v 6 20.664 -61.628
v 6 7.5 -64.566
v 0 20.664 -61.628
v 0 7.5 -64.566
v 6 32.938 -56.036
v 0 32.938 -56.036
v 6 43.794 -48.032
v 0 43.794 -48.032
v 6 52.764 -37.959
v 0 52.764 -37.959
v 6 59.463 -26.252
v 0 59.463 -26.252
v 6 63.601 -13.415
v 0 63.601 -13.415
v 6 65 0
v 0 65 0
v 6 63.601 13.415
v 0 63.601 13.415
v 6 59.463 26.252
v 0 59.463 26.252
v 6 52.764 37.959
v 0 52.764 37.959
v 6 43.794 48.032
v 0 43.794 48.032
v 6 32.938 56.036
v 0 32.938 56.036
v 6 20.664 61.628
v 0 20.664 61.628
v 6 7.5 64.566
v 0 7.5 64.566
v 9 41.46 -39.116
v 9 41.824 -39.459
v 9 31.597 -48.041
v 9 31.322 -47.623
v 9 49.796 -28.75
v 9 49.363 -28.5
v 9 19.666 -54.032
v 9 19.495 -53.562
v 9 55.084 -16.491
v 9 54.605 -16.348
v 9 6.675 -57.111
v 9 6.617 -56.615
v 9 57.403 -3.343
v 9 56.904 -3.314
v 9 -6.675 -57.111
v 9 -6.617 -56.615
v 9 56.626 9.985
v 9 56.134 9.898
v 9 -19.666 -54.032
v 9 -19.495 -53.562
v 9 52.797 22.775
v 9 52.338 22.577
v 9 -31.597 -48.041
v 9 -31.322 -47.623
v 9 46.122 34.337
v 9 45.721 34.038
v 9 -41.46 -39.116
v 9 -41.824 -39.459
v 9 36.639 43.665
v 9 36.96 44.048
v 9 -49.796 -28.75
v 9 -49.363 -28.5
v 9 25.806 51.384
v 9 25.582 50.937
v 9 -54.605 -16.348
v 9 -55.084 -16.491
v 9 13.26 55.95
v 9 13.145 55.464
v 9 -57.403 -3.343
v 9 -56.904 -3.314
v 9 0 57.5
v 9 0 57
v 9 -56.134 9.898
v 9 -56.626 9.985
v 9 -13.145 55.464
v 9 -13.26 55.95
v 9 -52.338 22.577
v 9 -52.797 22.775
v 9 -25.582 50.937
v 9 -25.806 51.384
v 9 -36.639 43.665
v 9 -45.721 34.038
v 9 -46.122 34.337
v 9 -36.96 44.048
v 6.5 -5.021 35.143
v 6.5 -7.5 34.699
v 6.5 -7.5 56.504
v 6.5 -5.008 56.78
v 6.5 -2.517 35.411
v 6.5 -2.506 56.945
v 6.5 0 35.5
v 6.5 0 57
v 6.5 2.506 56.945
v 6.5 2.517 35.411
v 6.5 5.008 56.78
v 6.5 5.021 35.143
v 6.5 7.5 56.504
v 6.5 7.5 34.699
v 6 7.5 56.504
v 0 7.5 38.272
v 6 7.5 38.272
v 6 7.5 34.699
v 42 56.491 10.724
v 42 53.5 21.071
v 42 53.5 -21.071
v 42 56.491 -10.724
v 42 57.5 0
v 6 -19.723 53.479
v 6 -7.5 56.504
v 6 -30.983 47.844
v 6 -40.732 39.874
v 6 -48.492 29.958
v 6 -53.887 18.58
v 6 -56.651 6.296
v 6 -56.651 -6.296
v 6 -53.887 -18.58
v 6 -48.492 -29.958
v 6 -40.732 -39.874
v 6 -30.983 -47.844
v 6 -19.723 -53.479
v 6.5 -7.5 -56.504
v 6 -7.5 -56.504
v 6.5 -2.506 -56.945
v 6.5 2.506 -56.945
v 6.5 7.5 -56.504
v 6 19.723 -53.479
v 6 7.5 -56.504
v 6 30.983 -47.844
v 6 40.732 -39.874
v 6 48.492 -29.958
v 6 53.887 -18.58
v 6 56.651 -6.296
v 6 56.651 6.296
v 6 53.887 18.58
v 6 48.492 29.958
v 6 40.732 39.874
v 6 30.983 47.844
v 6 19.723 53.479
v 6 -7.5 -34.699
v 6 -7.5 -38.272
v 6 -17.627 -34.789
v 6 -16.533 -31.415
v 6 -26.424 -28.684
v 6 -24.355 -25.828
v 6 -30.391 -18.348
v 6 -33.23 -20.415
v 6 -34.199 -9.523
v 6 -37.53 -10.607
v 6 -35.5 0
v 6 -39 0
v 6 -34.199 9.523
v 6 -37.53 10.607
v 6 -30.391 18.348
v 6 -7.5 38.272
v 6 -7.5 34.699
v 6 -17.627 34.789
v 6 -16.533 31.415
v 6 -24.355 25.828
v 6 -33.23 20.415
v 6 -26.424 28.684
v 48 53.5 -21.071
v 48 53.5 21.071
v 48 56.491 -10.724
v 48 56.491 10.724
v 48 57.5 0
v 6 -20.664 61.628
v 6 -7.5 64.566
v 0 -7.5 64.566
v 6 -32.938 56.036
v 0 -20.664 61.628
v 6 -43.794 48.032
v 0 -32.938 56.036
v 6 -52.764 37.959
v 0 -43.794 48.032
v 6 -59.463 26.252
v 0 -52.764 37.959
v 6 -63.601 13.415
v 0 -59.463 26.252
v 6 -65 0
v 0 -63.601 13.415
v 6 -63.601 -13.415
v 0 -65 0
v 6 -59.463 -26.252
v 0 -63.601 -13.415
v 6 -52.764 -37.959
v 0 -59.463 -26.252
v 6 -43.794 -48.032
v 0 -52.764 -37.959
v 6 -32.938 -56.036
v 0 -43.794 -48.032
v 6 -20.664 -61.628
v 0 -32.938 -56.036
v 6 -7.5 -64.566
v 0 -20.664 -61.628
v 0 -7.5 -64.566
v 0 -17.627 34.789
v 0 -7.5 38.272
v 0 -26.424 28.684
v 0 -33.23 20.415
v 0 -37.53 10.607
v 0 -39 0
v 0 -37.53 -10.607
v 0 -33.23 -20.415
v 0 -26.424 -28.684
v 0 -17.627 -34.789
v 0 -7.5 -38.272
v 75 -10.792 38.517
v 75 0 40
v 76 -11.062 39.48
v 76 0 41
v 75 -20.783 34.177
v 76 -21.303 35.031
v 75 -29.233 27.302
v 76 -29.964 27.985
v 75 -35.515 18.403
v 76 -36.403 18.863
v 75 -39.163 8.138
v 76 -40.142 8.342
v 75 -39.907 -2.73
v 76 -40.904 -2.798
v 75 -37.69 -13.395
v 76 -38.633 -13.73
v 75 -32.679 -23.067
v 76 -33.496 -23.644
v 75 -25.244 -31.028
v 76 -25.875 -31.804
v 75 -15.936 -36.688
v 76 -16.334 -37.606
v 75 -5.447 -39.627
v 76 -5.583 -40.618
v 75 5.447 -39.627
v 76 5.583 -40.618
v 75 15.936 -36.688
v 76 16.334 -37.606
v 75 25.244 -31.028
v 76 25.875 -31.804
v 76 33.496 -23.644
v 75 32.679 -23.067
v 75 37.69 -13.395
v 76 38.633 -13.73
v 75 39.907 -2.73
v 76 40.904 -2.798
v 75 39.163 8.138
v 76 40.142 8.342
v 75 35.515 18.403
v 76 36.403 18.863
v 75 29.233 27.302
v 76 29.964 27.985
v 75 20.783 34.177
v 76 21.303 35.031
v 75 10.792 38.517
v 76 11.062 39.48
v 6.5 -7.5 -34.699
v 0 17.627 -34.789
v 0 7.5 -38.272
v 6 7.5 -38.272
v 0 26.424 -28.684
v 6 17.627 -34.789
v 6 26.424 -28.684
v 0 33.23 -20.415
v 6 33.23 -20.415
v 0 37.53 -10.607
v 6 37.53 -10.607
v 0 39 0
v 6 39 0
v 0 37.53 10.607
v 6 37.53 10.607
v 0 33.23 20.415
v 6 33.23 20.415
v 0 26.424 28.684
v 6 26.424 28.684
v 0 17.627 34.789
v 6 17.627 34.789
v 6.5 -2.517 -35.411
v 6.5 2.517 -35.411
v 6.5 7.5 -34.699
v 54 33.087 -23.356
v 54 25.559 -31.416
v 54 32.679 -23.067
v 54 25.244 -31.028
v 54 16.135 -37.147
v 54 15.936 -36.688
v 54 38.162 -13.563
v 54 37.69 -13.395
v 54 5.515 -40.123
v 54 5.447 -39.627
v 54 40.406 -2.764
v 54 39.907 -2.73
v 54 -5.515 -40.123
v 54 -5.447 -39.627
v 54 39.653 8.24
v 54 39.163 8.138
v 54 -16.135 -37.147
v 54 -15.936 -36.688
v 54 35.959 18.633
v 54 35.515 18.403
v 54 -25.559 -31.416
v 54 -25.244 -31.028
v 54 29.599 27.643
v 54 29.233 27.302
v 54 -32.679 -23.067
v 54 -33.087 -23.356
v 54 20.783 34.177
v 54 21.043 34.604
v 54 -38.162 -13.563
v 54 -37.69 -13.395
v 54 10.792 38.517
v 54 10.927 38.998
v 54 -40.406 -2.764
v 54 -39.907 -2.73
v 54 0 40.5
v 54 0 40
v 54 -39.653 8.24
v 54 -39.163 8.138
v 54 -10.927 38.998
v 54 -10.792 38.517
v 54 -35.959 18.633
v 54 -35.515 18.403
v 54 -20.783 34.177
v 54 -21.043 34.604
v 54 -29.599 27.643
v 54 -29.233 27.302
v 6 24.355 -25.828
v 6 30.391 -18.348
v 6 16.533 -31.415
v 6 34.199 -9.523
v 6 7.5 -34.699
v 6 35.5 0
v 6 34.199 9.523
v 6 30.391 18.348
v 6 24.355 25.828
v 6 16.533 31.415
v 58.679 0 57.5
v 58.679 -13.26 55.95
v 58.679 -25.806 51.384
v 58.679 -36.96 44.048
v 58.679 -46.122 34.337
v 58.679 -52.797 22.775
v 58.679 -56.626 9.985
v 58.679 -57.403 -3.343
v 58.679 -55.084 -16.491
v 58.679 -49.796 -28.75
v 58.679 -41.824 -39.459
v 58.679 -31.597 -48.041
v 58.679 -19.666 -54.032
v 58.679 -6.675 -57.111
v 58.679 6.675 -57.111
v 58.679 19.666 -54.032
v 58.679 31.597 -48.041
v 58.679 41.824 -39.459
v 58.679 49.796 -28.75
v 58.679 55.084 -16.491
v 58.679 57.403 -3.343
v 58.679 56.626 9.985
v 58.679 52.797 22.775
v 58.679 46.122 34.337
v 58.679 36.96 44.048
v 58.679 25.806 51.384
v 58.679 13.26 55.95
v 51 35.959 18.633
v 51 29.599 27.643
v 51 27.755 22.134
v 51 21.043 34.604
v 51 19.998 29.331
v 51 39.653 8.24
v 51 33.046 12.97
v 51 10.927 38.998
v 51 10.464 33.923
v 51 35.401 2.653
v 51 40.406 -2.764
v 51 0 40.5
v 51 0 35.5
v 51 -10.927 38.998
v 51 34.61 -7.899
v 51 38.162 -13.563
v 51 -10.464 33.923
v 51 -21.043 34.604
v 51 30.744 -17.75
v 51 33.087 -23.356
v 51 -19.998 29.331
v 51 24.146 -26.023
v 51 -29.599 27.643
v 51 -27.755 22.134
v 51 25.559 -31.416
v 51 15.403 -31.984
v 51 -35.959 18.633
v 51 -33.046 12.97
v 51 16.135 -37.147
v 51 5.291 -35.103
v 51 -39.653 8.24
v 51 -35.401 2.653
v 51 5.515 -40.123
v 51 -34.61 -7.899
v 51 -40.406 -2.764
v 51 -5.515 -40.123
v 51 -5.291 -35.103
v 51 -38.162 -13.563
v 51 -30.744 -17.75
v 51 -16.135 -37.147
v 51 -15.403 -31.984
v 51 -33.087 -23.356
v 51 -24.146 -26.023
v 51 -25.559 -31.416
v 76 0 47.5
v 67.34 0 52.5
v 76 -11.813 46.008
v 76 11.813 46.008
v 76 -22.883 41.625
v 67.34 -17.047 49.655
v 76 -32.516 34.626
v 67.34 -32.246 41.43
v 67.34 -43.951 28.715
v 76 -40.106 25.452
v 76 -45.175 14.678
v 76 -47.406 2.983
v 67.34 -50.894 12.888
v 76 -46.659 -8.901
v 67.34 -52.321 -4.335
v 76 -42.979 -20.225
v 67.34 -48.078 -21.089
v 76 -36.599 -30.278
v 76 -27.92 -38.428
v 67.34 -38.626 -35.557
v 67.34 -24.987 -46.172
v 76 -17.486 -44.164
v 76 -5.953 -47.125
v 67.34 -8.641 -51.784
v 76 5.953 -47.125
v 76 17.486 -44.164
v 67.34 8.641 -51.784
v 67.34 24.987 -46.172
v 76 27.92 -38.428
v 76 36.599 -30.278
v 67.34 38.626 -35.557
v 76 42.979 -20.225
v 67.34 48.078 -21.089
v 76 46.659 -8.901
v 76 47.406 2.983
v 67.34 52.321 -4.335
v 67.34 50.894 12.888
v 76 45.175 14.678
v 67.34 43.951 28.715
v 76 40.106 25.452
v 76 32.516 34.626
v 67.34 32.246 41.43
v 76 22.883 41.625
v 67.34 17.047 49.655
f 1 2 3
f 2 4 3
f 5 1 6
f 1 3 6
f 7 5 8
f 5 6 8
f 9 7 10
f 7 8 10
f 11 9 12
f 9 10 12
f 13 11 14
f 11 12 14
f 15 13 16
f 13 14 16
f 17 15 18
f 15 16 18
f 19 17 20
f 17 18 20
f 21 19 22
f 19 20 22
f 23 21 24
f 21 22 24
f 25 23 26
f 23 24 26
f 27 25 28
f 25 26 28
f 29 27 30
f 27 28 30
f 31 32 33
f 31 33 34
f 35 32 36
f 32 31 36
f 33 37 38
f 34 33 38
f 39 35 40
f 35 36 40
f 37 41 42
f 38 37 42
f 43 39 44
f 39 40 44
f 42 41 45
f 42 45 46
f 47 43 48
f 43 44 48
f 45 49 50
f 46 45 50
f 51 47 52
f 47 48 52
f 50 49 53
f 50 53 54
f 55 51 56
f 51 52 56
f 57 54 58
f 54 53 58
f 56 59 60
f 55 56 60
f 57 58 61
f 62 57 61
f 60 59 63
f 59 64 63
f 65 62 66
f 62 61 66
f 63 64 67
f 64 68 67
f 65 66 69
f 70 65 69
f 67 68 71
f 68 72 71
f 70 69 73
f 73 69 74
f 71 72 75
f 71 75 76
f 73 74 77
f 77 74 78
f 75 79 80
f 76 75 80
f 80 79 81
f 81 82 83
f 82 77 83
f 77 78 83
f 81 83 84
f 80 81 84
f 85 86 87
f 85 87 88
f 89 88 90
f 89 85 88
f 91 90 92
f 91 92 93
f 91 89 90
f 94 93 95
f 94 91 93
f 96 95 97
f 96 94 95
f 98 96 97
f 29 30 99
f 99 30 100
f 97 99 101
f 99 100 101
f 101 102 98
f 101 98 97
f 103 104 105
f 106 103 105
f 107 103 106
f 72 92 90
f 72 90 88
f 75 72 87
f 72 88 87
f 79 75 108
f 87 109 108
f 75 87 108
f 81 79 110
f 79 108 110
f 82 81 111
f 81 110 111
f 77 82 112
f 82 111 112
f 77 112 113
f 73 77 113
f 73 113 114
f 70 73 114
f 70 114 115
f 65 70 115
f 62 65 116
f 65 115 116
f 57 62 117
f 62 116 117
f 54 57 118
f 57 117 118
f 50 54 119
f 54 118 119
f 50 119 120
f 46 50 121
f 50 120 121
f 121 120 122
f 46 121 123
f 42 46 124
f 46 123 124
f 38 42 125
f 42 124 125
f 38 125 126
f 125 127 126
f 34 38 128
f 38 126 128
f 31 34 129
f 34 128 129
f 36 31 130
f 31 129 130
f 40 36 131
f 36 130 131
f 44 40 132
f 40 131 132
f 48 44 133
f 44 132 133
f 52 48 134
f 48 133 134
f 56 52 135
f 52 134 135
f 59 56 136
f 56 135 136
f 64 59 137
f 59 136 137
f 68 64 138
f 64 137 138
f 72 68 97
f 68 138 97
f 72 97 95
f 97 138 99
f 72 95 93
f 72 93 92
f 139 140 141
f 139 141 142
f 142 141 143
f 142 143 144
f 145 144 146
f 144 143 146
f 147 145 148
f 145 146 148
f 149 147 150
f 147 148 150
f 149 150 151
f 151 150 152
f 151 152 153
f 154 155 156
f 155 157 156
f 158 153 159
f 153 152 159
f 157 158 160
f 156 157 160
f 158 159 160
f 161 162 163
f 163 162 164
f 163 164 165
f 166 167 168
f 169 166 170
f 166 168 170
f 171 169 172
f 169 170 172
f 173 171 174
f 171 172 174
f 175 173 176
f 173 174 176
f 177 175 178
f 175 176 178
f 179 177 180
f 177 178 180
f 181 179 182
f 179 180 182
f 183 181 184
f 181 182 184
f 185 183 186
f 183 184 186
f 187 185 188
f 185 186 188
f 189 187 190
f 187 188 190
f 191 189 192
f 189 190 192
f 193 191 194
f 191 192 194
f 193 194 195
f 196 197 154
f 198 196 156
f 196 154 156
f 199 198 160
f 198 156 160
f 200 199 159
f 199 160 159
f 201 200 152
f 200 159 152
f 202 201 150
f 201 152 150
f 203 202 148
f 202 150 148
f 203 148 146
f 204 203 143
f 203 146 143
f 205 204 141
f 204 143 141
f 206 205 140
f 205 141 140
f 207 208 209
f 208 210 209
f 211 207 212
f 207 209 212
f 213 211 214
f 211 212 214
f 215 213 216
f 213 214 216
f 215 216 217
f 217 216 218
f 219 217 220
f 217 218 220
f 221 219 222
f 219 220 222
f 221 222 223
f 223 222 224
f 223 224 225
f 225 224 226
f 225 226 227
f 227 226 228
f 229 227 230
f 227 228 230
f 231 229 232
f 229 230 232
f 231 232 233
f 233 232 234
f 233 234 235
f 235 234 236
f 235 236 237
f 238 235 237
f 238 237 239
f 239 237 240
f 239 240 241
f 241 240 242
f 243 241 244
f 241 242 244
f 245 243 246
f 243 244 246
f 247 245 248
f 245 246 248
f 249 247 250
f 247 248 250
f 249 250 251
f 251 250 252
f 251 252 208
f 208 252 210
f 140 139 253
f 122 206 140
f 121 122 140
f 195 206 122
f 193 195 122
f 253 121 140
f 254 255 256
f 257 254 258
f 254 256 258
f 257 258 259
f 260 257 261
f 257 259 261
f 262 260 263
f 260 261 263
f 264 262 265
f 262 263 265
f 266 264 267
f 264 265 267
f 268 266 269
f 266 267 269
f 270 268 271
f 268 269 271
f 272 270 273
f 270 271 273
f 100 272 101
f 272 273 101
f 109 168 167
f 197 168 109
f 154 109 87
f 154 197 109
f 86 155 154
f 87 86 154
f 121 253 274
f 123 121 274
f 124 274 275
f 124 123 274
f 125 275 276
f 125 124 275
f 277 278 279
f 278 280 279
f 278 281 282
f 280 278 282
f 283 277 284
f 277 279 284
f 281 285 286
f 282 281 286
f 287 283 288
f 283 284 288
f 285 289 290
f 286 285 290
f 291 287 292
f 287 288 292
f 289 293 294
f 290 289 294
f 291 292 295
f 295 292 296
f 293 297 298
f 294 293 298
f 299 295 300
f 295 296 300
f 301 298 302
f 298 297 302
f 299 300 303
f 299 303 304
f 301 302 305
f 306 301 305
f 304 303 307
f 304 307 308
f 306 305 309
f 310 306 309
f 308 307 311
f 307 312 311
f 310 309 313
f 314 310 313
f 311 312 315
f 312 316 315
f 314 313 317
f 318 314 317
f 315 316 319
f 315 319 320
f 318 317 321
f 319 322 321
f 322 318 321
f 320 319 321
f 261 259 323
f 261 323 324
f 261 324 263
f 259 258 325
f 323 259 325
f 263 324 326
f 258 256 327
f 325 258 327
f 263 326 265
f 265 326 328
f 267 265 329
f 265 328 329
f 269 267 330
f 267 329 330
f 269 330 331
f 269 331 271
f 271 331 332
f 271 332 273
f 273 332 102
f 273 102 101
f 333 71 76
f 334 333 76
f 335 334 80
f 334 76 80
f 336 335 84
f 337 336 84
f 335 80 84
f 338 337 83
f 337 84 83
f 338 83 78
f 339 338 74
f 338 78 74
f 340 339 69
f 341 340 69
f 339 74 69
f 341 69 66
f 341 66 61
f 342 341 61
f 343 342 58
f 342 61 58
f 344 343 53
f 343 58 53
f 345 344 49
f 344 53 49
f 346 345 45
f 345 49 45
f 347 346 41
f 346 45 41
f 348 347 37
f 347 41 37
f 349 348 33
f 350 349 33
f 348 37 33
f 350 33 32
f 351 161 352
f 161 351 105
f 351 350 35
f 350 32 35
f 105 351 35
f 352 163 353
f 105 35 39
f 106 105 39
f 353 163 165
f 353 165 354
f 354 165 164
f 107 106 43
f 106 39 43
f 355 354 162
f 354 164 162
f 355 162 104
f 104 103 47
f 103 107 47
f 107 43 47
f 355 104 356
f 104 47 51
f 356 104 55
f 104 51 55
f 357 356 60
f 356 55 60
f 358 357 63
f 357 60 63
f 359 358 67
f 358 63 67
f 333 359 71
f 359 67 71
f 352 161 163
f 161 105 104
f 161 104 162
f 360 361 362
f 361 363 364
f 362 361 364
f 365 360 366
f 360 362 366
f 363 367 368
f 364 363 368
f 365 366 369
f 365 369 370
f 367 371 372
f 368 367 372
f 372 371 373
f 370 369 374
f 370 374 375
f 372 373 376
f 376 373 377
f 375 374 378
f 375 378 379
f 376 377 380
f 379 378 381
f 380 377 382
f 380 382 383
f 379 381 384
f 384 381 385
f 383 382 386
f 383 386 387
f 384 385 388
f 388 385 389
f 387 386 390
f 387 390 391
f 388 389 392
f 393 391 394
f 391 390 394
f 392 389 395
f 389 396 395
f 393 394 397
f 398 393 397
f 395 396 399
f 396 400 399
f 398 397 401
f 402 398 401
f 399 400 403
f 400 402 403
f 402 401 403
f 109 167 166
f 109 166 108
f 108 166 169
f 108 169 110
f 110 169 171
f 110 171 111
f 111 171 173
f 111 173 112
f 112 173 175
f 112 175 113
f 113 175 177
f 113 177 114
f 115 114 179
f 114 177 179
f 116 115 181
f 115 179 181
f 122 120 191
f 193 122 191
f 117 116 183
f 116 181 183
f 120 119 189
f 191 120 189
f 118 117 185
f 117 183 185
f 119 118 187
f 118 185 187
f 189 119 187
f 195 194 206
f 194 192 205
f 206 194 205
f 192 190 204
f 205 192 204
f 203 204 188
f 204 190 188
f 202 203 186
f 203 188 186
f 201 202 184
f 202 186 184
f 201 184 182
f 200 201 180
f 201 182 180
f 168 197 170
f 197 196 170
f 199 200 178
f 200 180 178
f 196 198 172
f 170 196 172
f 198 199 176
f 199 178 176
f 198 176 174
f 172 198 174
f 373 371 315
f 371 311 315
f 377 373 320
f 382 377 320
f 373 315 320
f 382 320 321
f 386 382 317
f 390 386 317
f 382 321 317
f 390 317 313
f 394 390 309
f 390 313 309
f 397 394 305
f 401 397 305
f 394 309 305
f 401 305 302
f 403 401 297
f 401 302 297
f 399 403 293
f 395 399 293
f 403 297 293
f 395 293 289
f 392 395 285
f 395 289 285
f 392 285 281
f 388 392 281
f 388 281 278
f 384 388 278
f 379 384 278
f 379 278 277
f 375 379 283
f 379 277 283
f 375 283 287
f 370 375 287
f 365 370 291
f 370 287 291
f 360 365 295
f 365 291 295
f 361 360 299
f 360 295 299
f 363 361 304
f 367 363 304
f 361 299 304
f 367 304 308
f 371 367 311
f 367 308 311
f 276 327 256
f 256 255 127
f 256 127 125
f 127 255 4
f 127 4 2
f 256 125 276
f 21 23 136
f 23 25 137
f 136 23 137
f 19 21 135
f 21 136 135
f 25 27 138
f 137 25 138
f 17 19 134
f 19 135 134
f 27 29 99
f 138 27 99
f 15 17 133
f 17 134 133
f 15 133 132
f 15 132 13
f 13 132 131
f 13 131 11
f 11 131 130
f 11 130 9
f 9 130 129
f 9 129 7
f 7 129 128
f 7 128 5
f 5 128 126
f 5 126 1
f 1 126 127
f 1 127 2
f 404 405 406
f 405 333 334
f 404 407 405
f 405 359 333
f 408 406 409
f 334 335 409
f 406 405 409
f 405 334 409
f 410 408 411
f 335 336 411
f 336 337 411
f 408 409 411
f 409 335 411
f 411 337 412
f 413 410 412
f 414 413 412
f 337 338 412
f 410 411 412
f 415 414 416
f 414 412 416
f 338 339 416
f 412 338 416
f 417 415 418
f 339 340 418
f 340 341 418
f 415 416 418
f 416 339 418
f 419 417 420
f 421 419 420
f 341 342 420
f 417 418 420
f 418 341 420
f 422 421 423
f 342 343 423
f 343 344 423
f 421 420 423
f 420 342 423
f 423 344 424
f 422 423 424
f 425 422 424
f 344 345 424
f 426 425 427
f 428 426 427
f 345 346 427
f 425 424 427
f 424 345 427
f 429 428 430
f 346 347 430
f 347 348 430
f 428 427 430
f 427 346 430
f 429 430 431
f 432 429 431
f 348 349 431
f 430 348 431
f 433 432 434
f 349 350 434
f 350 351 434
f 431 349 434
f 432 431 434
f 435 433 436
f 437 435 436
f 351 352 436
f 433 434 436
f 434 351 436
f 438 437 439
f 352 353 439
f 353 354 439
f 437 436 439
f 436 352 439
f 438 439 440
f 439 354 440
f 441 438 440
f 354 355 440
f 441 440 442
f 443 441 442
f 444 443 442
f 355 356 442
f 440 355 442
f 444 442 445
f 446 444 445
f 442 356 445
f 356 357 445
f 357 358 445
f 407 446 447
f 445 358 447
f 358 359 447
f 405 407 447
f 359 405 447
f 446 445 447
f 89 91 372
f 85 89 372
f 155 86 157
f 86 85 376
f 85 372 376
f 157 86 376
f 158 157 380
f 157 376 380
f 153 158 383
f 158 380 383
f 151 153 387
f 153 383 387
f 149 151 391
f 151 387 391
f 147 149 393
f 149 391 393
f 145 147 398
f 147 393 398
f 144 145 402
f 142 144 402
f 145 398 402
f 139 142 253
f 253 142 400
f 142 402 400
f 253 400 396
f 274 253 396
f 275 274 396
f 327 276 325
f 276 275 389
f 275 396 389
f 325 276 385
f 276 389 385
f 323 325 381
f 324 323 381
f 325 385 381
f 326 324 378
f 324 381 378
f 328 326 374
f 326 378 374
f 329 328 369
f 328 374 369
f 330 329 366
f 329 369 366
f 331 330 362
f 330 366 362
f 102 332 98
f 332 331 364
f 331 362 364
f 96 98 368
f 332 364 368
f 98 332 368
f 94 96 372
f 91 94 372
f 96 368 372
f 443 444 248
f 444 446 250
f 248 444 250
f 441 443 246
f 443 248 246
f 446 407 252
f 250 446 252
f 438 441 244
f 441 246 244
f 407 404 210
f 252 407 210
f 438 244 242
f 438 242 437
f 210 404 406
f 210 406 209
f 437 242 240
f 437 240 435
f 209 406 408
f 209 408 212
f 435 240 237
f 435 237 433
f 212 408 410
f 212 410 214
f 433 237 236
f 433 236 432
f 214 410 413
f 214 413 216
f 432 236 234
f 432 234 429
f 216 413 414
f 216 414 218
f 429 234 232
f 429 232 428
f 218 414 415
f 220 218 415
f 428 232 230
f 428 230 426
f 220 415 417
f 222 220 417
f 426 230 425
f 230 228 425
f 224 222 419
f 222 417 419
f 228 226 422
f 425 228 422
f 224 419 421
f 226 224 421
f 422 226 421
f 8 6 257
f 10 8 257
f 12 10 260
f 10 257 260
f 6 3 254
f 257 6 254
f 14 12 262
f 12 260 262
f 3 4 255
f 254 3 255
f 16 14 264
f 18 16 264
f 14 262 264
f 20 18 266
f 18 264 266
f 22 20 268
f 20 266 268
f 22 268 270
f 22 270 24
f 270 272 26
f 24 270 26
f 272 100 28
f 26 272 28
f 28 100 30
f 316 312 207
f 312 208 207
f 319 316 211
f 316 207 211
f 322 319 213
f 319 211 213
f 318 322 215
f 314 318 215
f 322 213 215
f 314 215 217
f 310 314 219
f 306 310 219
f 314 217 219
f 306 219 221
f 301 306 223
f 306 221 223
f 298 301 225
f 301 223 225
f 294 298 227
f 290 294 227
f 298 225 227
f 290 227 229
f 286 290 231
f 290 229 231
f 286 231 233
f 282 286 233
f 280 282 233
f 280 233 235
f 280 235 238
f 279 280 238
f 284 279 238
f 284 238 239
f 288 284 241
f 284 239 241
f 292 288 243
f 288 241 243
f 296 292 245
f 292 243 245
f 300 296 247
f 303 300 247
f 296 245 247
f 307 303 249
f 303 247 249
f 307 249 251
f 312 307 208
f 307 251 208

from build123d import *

# Parameters (mm, degrees)
CUT_EXTRUDE_1_DEPTH      = 120.272796563
CUT_EXTRUDE_1_DEPTH_BACK = 120.272796563
SKETCH_2_W               = 6
SKETCH_2_H               = 4
SKETCH_2_W_2             = 6.5
SKETCH_2_H_2             = 15


with BuildPart() as part:
    # Эскиз1 → Повернуть1 (revolve)
    with BuildSketch(Plane.XY, mode=Mode.PRIVATE) as revolve_1_sk:
        Polygon((0, 39), (6, 39), (6, 35.5), (51, 35.5), (51, 40.5), (54, 40.5), (54, 40), (75, 40), (76, 41), (76, 47.5), (58.679491924, 57.5), (9, 57.5), (9, 57), (6, 57), (6, 65), (0, 65), align=None)
    revolve(revolve_1_sk.sketch.rotate(Axis((0, 0, 0), (1, 0, 0)), 90), axis=Axis((0, 0, 0), (1, 0, 0)))

    # Эскиз2 → Вырез-Вытянуть1 (cut, two sides: drawn at the far end of the back side and taken through both)
    with BuildSketch(Plane.XY.offset(-CUT_EXTRUDE_1_DEPTH_BACK)):
        with Locations((45, 55.5)):
            Rectangle(SKETCH_2_W, SKETCH_2_H)
        with Locations((3.25, 0)):
            Rectangle(SKETCH_2_W_2, SKETCH_2_H_2)
    extrude(amount=CUT_EXTRUDE_1_DEPTH + CUT_EXTRUDE_1_DEPTH_BACK, mode=Mode.SUBTRACT)


solid = part.part
